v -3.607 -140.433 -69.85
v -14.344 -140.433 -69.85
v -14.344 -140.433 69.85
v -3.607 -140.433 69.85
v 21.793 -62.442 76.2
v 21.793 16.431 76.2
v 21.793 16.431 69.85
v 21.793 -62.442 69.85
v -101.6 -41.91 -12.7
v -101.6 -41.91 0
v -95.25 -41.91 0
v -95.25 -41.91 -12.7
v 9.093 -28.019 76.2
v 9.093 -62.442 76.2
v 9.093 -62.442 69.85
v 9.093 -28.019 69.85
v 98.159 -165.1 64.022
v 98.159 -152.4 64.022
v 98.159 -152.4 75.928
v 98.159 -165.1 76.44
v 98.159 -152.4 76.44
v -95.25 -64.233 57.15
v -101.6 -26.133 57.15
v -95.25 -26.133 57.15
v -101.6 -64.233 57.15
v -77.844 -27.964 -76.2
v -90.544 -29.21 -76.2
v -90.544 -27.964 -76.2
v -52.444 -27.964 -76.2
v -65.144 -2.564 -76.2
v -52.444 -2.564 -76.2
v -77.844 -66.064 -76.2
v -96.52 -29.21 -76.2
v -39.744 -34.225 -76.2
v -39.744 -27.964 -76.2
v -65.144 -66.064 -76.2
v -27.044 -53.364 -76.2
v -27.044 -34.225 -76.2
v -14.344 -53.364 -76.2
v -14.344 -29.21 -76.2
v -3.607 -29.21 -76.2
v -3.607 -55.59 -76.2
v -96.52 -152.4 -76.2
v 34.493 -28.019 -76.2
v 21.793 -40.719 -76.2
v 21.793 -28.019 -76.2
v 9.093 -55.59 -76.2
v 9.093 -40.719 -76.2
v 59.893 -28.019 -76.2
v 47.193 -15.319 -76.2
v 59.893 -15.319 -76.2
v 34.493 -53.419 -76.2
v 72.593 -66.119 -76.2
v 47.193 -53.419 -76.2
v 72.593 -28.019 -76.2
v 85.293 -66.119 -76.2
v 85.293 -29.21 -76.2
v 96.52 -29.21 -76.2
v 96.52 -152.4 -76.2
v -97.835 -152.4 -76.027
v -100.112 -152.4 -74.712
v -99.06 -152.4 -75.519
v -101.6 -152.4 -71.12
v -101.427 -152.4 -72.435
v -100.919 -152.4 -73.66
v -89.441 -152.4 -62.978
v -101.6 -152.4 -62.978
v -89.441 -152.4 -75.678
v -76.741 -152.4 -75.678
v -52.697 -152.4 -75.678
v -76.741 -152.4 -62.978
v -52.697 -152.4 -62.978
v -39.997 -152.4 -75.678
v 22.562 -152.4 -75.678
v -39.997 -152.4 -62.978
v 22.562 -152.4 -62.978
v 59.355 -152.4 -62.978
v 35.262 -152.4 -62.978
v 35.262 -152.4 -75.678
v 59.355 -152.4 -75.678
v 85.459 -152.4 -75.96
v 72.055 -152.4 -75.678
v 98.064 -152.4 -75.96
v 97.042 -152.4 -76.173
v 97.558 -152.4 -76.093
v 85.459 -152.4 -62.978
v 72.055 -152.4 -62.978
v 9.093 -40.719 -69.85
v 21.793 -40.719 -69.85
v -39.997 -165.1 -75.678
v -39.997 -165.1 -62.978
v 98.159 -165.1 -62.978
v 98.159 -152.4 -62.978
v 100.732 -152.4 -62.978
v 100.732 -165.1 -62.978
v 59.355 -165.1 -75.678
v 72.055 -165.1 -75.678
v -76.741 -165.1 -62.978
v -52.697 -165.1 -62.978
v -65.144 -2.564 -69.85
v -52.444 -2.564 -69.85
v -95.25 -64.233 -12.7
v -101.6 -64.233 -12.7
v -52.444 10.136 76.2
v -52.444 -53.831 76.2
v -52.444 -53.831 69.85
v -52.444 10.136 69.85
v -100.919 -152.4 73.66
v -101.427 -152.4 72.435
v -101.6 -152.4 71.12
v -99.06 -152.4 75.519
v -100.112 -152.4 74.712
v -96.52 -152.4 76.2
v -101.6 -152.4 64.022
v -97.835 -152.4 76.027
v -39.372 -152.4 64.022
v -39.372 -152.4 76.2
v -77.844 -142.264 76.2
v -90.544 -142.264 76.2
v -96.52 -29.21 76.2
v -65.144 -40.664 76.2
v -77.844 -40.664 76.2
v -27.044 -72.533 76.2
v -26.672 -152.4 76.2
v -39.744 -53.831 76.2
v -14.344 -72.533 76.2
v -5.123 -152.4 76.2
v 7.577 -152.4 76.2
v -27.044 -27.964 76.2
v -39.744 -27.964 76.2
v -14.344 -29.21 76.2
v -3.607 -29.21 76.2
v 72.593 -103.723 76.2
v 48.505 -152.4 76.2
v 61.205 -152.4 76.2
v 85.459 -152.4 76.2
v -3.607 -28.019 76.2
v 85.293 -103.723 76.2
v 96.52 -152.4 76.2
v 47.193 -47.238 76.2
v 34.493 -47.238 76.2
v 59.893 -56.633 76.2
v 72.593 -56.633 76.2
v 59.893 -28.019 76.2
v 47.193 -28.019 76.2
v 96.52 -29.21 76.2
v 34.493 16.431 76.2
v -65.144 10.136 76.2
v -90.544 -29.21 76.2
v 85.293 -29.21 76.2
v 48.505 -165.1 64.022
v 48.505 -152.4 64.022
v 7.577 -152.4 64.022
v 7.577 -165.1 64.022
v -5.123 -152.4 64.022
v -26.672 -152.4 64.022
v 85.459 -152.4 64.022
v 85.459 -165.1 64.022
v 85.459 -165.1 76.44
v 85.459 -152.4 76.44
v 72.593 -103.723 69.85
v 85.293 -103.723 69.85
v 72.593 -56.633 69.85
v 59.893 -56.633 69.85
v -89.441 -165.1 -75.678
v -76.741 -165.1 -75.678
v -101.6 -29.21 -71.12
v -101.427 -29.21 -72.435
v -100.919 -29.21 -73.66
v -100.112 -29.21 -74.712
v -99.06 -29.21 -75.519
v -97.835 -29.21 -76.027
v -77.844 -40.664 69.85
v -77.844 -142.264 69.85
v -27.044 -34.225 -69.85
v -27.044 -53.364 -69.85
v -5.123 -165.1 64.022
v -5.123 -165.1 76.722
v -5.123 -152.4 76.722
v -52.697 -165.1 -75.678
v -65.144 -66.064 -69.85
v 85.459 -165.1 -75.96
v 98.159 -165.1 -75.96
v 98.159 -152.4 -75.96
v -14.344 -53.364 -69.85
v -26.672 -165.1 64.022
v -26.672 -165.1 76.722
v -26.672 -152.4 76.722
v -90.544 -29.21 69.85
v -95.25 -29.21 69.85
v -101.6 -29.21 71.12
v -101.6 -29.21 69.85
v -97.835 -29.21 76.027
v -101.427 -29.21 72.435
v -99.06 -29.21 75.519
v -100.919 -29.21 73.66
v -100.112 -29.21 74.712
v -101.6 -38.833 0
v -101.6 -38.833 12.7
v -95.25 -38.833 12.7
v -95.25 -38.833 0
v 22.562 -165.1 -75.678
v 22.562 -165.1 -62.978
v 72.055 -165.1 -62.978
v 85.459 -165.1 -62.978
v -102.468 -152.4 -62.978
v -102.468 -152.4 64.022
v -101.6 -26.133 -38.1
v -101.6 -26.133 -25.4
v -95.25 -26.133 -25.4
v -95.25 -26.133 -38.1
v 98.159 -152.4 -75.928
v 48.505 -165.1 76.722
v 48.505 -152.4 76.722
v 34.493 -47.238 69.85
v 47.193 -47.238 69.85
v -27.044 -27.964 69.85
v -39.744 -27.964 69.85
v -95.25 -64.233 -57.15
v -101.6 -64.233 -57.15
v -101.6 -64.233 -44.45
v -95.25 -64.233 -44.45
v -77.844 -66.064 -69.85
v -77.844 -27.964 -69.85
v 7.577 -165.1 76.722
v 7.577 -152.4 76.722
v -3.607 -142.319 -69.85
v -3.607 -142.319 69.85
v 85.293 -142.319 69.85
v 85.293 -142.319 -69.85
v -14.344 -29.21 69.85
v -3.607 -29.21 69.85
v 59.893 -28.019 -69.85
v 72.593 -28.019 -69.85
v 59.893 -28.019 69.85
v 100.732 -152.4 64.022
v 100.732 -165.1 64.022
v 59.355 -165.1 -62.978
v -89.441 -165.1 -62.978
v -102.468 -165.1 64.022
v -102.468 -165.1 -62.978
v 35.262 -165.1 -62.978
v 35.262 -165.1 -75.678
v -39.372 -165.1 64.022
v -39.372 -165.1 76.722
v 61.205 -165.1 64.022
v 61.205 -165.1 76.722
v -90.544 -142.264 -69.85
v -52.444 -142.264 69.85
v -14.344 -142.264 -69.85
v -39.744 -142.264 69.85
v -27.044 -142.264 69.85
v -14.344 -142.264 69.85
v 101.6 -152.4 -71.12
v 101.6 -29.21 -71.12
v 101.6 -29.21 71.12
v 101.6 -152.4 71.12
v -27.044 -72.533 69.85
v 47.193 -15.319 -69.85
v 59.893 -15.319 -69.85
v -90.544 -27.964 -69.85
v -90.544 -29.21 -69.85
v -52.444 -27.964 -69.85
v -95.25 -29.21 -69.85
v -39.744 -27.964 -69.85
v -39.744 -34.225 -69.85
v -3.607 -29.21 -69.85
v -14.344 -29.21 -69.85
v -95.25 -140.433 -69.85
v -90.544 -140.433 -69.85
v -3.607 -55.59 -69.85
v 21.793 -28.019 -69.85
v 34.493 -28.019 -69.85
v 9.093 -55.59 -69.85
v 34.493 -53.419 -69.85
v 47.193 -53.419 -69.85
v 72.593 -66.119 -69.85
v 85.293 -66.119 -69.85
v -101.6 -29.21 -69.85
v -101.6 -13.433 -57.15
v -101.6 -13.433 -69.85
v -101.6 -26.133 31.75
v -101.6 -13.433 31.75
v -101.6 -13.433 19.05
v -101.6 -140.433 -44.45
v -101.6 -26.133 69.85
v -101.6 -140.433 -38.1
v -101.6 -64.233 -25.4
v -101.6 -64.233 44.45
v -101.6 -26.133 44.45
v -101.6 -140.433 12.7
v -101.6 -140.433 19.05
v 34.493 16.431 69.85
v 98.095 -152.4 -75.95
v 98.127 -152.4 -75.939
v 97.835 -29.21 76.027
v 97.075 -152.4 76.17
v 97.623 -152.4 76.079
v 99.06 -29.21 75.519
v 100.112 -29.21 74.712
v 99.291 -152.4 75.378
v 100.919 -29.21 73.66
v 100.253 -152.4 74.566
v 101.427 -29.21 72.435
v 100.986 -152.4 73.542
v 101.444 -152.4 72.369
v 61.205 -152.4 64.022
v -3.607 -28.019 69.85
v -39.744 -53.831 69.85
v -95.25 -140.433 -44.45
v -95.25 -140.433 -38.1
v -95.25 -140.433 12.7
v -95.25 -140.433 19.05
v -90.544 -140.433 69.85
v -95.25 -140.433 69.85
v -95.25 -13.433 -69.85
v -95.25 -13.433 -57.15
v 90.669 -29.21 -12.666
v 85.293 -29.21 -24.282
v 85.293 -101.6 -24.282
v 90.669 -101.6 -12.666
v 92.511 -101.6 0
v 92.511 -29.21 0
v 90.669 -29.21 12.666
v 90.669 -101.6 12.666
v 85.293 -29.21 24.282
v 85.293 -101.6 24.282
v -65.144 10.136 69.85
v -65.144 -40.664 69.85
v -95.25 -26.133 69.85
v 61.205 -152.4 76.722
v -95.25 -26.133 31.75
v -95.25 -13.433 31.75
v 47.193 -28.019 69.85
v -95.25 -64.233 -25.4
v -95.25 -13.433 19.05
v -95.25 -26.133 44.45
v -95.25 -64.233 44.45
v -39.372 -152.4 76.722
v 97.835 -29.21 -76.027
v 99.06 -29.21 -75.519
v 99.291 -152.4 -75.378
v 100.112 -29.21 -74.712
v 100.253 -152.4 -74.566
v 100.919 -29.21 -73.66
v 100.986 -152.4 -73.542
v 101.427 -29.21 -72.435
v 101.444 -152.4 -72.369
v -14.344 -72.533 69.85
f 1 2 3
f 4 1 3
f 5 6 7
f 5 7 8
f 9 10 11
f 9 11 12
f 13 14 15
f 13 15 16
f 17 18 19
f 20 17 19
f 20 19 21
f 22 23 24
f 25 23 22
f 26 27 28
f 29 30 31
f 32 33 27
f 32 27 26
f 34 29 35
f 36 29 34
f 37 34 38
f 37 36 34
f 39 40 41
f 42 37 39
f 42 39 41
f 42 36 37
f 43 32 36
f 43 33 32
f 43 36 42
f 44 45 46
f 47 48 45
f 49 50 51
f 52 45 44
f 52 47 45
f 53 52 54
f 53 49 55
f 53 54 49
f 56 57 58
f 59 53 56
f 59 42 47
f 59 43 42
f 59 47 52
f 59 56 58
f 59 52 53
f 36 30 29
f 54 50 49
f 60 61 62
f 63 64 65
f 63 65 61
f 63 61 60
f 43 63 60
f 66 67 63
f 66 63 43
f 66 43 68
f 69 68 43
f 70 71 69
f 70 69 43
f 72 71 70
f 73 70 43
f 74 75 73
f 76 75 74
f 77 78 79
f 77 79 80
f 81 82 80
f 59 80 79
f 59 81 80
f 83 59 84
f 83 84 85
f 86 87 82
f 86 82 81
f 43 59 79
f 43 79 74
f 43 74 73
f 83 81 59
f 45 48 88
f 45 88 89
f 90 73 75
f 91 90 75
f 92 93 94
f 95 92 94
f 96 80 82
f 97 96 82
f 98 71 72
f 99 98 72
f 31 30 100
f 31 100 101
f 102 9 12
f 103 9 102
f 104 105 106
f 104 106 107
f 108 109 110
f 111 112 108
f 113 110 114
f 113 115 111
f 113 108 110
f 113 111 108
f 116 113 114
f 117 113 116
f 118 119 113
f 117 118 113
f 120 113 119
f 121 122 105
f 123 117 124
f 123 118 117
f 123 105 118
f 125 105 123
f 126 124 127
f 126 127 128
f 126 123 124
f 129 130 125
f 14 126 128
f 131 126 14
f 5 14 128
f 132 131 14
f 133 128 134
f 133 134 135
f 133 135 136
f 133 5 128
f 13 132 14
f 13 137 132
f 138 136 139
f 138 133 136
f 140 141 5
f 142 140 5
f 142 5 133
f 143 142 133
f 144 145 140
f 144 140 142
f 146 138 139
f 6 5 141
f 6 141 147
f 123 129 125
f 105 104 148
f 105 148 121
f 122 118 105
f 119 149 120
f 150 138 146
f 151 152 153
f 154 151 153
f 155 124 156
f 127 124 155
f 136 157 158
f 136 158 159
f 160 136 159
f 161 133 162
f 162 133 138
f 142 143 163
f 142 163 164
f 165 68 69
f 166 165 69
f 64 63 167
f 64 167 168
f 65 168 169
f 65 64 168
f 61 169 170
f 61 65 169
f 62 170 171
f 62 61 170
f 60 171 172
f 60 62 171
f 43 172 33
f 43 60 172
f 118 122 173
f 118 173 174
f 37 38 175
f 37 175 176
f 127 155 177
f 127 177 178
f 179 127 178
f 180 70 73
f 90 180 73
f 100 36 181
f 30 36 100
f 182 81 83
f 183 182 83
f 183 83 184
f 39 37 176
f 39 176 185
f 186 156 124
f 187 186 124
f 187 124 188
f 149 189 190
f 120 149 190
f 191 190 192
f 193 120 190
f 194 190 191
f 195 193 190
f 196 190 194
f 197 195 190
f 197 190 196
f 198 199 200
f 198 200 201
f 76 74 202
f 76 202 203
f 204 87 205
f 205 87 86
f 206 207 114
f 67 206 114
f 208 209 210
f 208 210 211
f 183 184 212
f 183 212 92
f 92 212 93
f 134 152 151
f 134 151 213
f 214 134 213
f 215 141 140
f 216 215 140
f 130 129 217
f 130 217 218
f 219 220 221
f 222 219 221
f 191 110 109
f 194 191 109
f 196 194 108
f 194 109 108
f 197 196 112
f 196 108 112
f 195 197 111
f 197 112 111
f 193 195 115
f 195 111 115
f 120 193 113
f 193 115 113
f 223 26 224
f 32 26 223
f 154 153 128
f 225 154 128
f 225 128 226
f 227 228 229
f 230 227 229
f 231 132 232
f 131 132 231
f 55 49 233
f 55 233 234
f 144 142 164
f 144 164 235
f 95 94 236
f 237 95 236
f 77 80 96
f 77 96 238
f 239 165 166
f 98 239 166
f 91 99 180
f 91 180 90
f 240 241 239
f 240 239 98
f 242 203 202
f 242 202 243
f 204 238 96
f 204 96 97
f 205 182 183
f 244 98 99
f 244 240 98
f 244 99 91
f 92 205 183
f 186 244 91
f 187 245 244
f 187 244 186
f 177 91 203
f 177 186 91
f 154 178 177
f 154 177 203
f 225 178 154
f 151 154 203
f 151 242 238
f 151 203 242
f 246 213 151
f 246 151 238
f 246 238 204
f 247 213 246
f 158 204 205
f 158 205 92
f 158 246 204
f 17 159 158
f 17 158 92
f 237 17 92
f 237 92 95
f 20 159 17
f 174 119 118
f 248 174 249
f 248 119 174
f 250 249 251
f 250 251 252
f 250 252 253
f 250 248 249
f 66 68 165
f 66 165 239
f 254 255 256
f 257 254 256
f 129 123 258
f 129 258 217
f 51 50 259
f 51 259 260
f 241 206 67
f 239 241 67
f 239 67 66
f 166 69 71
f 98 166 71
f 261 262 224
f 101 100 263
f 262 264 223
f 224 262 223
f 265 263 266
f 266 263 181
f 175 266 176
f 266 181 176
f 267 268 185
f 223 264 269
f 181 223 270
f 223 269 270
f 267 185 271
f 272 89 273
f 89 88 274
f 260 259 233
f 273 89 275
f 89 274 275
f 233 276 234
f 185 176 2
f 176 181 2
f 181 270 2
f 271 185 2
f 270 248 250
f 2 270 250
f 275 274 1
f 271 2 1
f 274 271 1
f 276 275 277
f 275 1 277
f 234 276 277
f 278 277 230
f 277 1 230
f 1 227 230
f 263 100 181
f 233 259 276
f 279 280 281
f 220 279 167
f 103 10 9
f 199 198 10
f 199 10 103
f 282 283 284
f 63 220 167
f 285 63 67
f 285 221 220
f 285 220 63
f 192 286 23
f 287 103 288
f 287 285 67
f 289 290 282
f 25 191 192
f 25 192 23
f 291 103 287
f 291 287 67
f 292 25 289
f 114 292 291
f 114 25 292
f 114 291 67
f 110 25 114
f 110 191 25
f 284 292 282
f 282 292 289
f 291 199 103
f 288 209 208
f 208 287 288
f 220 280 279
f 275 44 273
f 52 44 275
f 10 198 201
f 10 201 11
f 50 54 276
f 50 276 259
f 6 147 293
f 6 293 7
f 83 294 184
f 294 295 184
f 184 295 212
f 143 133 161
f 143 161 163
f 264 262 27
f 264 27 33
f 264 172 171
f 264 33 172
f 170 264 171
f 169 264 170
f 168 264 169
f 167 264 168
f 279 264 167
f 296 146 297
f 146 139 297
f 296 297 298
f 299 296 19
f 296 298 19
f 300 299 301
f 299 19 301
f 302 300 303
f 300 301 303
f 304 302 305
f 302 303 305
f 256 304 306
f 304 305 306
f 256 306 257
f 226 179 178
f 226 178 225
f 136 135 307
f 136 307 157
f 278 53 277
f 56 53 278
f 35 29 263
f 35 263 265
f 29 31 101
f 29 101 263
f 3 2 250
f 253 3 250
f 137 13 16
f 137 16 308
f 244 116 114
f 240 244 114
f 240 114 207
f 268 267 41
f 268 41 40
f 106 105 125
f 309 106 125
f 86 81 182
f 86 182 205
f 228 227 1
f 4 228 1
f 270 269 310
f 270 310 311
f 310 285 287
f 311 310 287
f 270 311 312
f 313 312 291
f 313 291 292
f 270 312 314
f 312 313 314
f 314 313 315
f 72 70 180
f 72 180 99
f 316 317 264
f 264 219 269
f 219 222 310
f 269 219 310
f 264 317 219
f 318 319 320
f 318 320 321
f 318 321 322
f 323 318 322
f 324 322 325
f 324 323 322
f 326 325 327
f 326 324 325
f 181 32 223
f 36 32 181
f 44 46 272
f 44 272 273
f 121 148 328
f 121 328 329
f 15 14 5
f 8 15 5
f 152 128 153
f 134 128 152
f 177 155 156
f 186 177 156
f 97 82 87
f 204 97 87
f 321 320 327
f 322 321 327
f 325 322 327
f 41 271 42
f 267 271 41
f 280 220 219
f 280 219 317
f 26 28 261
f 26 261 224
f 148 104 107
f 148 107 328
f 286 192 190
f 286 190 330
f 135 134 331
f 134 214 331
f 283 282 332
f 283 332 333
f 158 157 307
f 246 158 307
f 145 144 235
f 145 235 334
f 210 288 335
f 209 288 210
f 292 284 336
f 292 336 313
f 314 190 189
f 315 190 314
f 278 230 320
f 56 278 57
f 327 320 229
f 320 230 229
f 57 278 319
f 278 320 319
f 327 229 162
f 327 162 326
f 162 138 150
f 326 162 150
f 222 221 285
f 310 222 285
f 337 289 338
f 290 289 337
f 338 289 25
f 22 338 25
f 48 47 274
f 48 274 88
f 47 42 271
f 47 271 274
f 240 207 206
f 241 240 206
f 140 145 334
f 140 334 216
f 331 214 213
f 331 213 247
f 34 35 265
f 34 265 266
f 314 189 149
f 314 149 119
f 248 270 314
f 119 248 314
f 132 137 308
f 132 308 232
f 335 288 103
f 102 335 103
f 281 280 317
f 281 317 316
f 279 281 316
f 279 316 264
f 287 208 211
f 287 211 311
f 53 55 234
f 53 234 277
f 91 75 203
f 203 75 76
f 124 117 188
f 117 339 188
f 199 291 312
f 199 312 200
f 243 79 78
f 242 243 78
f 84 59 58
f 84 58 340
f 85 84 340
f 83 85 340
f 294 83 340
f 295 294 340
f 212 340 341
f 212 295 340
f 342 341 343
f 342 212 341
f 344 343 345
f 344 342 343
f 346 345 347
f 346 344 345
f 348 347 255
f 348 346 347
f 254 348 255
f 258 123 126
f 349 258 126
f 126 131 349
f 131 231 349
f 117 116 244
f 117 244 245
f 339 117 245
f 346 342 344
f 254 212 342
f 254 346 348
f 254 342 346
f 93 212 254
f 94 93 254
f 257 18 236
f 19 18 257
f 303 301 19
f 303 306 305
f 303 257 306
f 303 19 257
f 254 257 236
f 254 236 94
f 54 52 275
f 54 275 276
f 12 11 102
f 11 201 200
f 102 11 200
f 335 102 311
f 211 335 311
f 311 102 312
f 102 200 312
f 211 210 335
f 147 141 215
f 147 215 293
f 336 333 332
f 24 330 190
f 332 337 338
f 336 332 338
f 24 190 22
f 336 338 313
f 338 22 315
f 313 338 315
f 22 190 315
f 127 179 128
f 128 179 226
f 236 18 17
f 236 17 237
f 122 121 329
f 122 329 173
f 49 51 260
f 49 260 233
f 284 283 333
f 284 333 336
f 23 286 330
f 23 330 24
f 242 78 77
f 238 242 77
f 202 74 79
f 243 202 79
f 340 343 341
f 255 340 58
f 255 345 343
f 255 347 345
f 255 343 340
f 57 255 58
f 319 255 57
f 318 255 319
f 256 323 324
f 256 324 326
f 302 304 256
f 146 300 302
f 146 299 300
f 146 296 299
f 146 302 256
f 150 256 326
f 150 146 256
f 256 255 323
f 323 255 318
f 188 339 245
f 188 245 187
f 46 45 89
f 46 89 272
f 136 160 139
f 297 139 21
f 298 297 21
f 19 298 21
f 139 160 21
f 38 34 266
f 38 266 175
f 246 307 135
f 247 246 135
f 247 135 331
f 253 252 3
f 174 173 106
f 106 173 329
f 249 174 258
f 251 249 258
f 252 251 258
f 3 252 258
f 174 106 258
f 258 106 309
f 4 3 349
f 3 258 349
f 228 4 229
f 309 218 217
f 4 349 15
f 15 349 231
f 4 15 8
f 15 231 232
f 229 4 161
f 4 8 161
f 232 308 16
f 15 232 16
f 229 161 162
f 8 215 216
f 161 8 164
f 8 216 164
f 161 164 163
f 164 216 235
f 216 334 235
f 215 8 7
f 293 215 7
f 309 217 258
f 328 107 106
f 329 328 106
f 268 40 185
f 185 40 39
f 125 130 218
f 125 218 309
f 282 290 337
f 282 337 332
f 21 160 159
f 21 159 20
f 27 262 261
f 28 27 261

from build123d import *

# Parameters (mm, degrees)
F0_W      = 203.2
F0_H      = 152.4
F2_DEPTH  = 152.4
F3_W      = 88.9
F3_H      = 139.7
F4_DEPTH  = 12.7
F5_R      = 6.35
F6_DEPTH  = 127
F1_R      = 44.45
F8_DEPTH  = 101.6
F9_R      = 5.08
F10_W     = 127
F10_H     = 139.7
F11_DEPTH = 101.6
F12_W     = 193.04
F12_H     = 142.24
F12_W_2   = 88.9
F12_H_2   = 139.7
F12_R     = 44.45
F12_R_2   = 6.35
F14_W     = 88.9
F14_H     = 139.7
F14_W_2   = 312.5441968441
F14_H_2   = 209.9168300629
F15_DEPTH = 29.21
F13_W     = 76.2
F13_H     = 127
F16_DEPTH = 152.4
F17_W     = 88.9
F17_H     = 127
F18_DEPTH = 253.619
F19_W     = 12.7
F19_H     = 38.596359849
F19_H_2   = 95.0815806389
F19_H_3   = 79.8769908249
F19_H_4   = 69.7309503555
F19_H_5   = 88.4333456159
F20_DEPTH = 6.35
F21_W     = 76.2
F21_H     = 12.7
F22_DEPTH = 6.35
F23_W     = 12.7
F23_H     = 76.2
F23_H_2   = 86.7299305499
F23_H_3   = 88.9
F24_DEPTH = 6.35
F25_W     = 12.7
F25_H     = 12.7
F25_H_2   = 12.4177324921
F25_H_3   = 127
F25_W_2   = 2.5730909735
F25_H_4   = 12.9822675079
F26_DEPTH = 12.7


with BuildPart() as f2:
    # F0 (on Front) → F2 (new body)
    with BuildSketch(Plane.XZ):
        Rectangle(F0_W, F0_H)
    extrude(amount=F2_DEPTH)

    # F3 (on Front) → F4 (cut)
    with BuildSketch(Plane.XZ):
        with Locations((-50.6012091197, -0.215793407)):
            Rectangle(F3_W, F3_H)
    extrude(amount=F4_DEPTH, mode=Mode.SUBTRACT)

    # F5 (on face) → F6 (cut)
    with BuildSketch(Plane(origin=(0, -12.7, 0), x_dir=(-1, 0, 0), z_dir=(0, 1, 0))):
        with Locations((19.2305770945, 52.8817098261)):
            Circle(F5_R)
        with Locations((19.2305770945, 31.2917098261)):
            Circle(F5_R)
        with Locations((19.2305770945, 9.7017098261)):
            Circle(F5_R)
        with Locations((19.2305770945, -11.8882901739)):
            Circle(F5_R)
        with Locations((19.2305770945, -33.4782901739)):
            Circle(F5_R)
        with Locations((19.2305770945, -55.0682901739)):
            Circle(F5_R)
        with Locations((40.8205770945, 52.8817098261)):
            Circle(F5_R)
        with Locations((40.8205770945, 31.2917098261)):
            Circle(F5_R)
        with Locations((40.8205770945, 9.7017098261)):
            Circle(F5_R)
        with Locations((40.8205770945, -11.8882901739)):
            Circle(F5_R)
        with Locations((40.8205770945, -33.4782901739)):
            Circle(F5_R)
        with Locations((40.8205770945, -55.0682901739)):
            Circle(F5_R)
        with Locations((62.4105770945, 52.8817098261)):
            Circle(F5_R)
        with Locations((62.4105770945, 31.2917098261)):
            Circle(F5_R)
        with Locations((62.4105770945, 9.7017098261)):
            Circle(F5_R)
        with Locations((62.4105770945, -11.8882901739)):
            Circle(F5_R)
        with Locations((62.4105770945, -33.4782901739)):
            Circle(F5_R)
        with Locations((62.4105770945, -55.0682901739)):
            Circle(F5_R)
        with Locations((84.0005770945, 52.8817098261)):
            Circle(F5_R)
        with Locations((84.0005770945, 31.2917098261)):
            Circle(F5_R)
        with Locations((84.0005770945, 9.7017098261)):
            Circle(F5_R)
        with Locations((84.0005770945, -11.8882901739)):
            Circle(F5_R)
        with Locations((84.0005770945, -33.4782901739)):
            Circle(F5_R)
        with Locations((84.0005770945, -55.0682901739)):
            Circle(F5_R)
    extrude(amount=-F6_DEPTH, mode=Mode.SUBTRACT)

    # F1 (on face) → F8 (cut)
    with BuildSketch(Plane.XZ):
        with Locations((48.0613298714, 0)):
            Circle(F1_R)
    extrude(amount=F8_DEPTH, mode=Mode.SUBTRACT)

    # F9
    f9_edges = [f2.edges().sort_by_distance(p)[0] for p in [
        (0, 0, 76.2),
        (101.6, 0, 0),
        (0, 0, -76.2),
        (-101.6, 0, 0),
        (-101.6, -76.2, -76.2),
        (101.6, -76.2, -76.2),
        (101.6, -76.2, 76.2),
        (-101.6, -76.2, 76.2),
    ]]
    fillet(f9_edges, radius=F9_R)

    # F10 (on face) → F11 (cut)
    with BuildSketch(Plane(origin=(-101.6, 0, 0), x_dir=(0, -1, 0), z_dir=(-1, 0, 0))):
        with Locations((76.9326984882, 0)):
            Rectangle(F10_W, F10_H)
    extrude(amount=-F11_DEPTH, mode=Mode.SUBTRACT)

    # F12 (on face) + F14 (on face) → F15 (cut)
    with BuildSketch(Plane(origin=(0, 0, 0), x_dir=(-1, 0, 0), z_dir=(0, 1, 0))):
        Rectangle(F12_W, F12_H)
        with Locations((50.6012091197, -0.215793407)):
            Rectangle(F12_W_2, F12_H_2, mode=Mode.SUBTRACT)
        with Locations((-48.0613298714, 0)):
            Circle(F12_R, mode=Mode.SUBTRACT)
        with Locations((-87.3994901776, 62.0860531926)):
            Circle(F12_R_2, mode=Mode.SUBTRACT)
    with BuildSketch(Plane(origin=(0, 0, 0), x_dir=(-1, 0, 0), z_dir=(0, 1, 0))):
        with Locations((50.6012091197, -0.215793407)):
            Rectangle(F14_W, F14_H)
        Rectangle(F14_W_2, F14_H_2)
    extrude(amount=-F15_DEPTH, mode=Mode.SUBTRACT)

    # F13 (on face) → F16 (cut)
    with BuildSketch(Plane(origin=(0, 0, -76.2), x_dir=(1, 0, 0), z_dir=(0, 0, -1))):
        with Locations((-52.4439588189, 78.7642598152)):
            Rectangle(F13_W, F13_H)
    extrude(amount=-F16_DEPTH, mode=Mode.SUBTRACT)

    # F17 (on Top) → F18 (cut, symmetric)
    with BuildSketch(Plane.XY):
        with Locations((40.8431477845, -78.819476068)):
            Rectangle(F17_W, F17_H)
    extrude(amount=F18_DEPTH, both=True, mode=Mode.SUBTRACT)

    # F19 (on face) → F20 (join)
    with BuildSketch(Plane.XY.offset(76.2)):
        with Locations((78.9431477845, -123.0212961435)):
            Rectangle(F19_W, F19_H)
        Polygon((59.8931477845, -142.319476068), (59.8931477845, -56.6326193511), (59.8931477845, -28.019476068), (47.1931477845, -28.019476068), (47.1931477845, -47.2378954291), (47.1931477845, -142.319476068), align=None)
        Polygon((72.5931477845, -142.319476068), (72.5931477845, -103.723116219), (72.5931477845, -56.6326193511), (59.8931477845, -56.6326193511), (59.8931477845, -142.319476068), align=None)
        with Locations((40.8431477845, -94.7786857486)):
            Rectangle(F19_W, F19_H_2)
        Polygon((21.7931477845, -62.4424852431), (21.7931477845, -142.319476068), (34.4931477845, -142.319476068), (34.4931477845, -47.2378954291), (34.4931477845, 16.430523932), (21.7931477845, 16.430523932), align=None)
        with Locations((15.4431477845, -102.3809806556)):
            Rectangle(F19_W, F19_H_3)
        with Locations((-20.6939588189, -107.3987846375)):
            Rectangle(F19_W, F19_H_4)
        Polygon((-39.7439588189, -53.8309141994), (-39.7439588189, -142.2642598152), (-27.0439588189, -142.2642598152), (-27.0439588189, -72.5333094597), (-27.0439588189, -27.9642598152), (-39.7439588189, -27.9642598152), align=None)
        with Locations((-46.0939588189, -98.0475870073)):
            Rectangle(F19_W, F19_H_5)
        Polygon((-65.1439588189, -40.6642598152), (-65.1439588189, -142.2642598152), (-52.4439588189, -142.2642598152), (-52.4439588189, -53.8309141994), (-52.4439588189, 10.1357401848), (-65.1439588189, 10.1357401848), align=None)
        Polygon((-77.8439588189, -91.4642598152), (-77.8439588189, -142.2642598152), (-65.1439588189, -142.2642598152), (-65.1439588189, -40.6642598152), (-77.8439588189, -40.6642598152), align=None)
        Polygon((-3.6068522155, -28.019476068), (-3.6068522155, -29.21), (-3.6068522155, -142.319476068), (9.0931477845, -142.319476068), (9.0931477845, -62.4424852431), (9.0931477845, -28.019476068), align=None)
    extrude(amount=-F20_DEPTH)

    # F21 (on face) → F22 (join)
    with BuildSketch(Plane(origin=(-101.6, 0, 0), x_dir=(0, -1, 0), z_dir=(-1, 0, 0))):
        Polygon((13.4326984882, -57.15), (13.4326984882, -69.85), (140.4326984882, -69.85), (140.4326984882, -57.15), (64.2326984882, -57.15), align=None)
        with Locations((102.3326984882, -50.8)):
            Rectangle(F21_W, F21_H)
        Polygon((26.1326984882, -25.4), (26.1326984882, -38.1), (140.4326984882, -38.1), (140.4326984882, -25.4), (64.2326984882, -25.4), align=None)
        with Locations((102.3326984882, -19.05)):
            Rectangle(F21_W, F21_H)
        Polygon((64.2326984882, -12.7), (140.4326984882, -12.7), (140.4326984882, 0), (41.91, 0), (41.91, -12.7), align=None)
        Polygon((41.91, 0), (140.4326984882, 0), (140.4326984882, 12.7), (38.8326984882, 12.7), (38.8326984882, 0), align=None)
        Polygon((13.4326984882, 31.75), (13.4326984882, 19.05), (140.4326984882, 19.05), (140.4326984882, 31.75), (26.1326984882, 31.75), align=None)
        Polygon((26.1326984882, 31.75), (140.4326984882, 31.75), (140.4326984882, 44.45), (64.2326984882, 44.45), (26.1326984882, 44.45), align=None)
        with Locations((102.3326984882, 50.8)):
            Rectangle(F21_W, F21_H)
        Polygon((64.2326984882, 57.15), (140.4326984882, 57.15), (140.4326984882, 69.85), (26.1326984882, 69.85), (26.1326984882, 57.15), align=None)
    extrude(amount=-F22_DEPTH)

    # F23 (on face) → F24 (join)
    with BuildSketch(Plane(origin=(0, 0, -76.2), x_dir=(1, 0, 0), z_dir=(0, 0, -1))):
        with Locations((78.9431477845, 104.219476068)):
            Rectangle(F23_W, F23_H)
        with Locations((2.7431477845, 98.9545107931)):
            Rectangle(F23_W, F23_H_2)
        with Locations((-20.6939588189, 97.8142598152)):
            Rectangle(F23_W, F23_H_3)
        Polygon((72.5931477845, 28.019476068), (72.5931477845, 66.119476068), (72.5931477845, 142.319476068), (59.8931477845, 142.319476068), (59.8931477845, 28.019476068), align=None)
        Polygon((59.8931477845, 28.019476068), (59.8931477845, 142.319476068), (47.1931477845, 142.319476068), (47.1931477845, 53.419476068), (47.1931477845, 15.319476068), (59.8931477845, 15.319476068), align=None)
        with Locations((40.8431477845, 97.869476068)):
            Rectangle(F23_W, F23_H_3)
        Polygon((34.4931477845, 53.419476068), (34.4931477845, 142.319476068), (21.7931477845, 142.319476068), (21.7931477845, 40.719476068), (21.7931477845, 28.019476068), (34.4931477845, 28.019476068), align=None)
        Polygon((21.7931477845, 40.719476068), (21.7931477845, 142.319476068), (9.0931477845, 142.319476068), (9.0931477845, 55.5895455182), (9.0931477845, 40.719476068), align=None)
        Polygon((-27.0439588189, 142.2642598152), (-39.7439588189, 142.2642598152), (-39.7439588189, 34.2246964574), (-27.0439588189, 34.2246964574), (-27.0439588189, 53.3642598152), align=None)
        Polygon((-39.7439588189, 142.2642598152), (-52.4439588189, 142.2642598152), (-52.4439588189, 27.9642598152), (-39.7439588189, 27.9642598152), (-39.7439588189, 34.2246964574), align=None)
        Polygon((-52.4439588189, 142.2642598152), (-65.1439588189, 142.2642598152), (-65.1439588189, 66.0642598152), (-65.1439588189, 2.5642598152), (-52.4439588189, 2.5642598152), (-52.4439588189, 27.9642598152), align=None)
        with Locations((-71.4939588189, 104.1642598152)):
            Rectangle(F23_W, F23_H)
        Polygon((-90.5439588189, 142.2642598152), (-90.5439588189, 29.21), (-90.5439588189, 27.9642598152), (-77.8439588189, 27.9642598152), (-77.8439588189, 66.0642598152), (-77.8439588189, 142.2642598152), align=None)
    extrude(amount=-F24_DEPTH)

    # F25 (on face) → F26 (join)
    with BuildSketch(Plane.XZ.offset(152.4)):
        Polygon((85.4586139321, 64.0224360317), (61.2050529242, 64.0224360317), (48.5050529242, 64.0224360317), (7.57732118, 64.0224360317), (-5.12267882, 64.0224360317), (-26.6723212183, 64.0224360317), (-39.3723212183, 64.0224360317), (-102.4682950944, 64.0224360317), (-102.4682950944, 44.3732525826), (-89.7682950944, 44.3732525826), (-89.7682950944, 31.6732525826), (-102.4682950944, 31.6732525826), (-102.4682950944, -25.3421988666), (-89.7682950944, -25.3421988666), (-89.7682950944, -38.0421988666), (-102.4682950944, -38.0421988666), (-102.4682950944, -62.9775639683), (-89.4405841827, -62.9775639683), (-76.7405841827, -62.9775639683), (-52.6970252395, -62.9775639683), (-39.9970252395, -62.9775639683), (22.5620511919, -62.9775639683), (35.2620511919, -62.9775639683), (59.3553744256, -62.9775639683), (72.0553744256, -62.9775639683), (85.4586139321, -62.9775639683), align=None)
        with Locations((54.8550529242, 70.3724360317)):
            Rectangle(F25_W, F25_H)
        with Locations((91.8086139321, 70.2313022777)):
            Rectangle(F25_W, F25_H_2)
        with Locations((91.8086139321, 0.5224360317)):
            Rectangle(F25_W, F25_H_3)
        with Locations((1.22732118, 70.3724360317)):
            Rectangle(F25_W, F25_H)
        with Locations((99.4451594189, 0.5224360317)):
            Rectangle(F25_W_2, F25_H_3)
        with Locations((91.8086139321, -69.4686977223)):
            Rectangle(F25_W, F25_H_4)
        with Locations((65.7053744256, -69.3275639683)):
            Rectangle(F25_W, F25_H)
        with Locations((-33.0223212183, 70.3724360317)):
            Rectangle(F25_W, F25_H)
        with Locations((28.9120511919, -69.3275639683)):
            Rectangle(F25_W, F25_H)
        with Locations((-96.1182950944, 38.0232525826)):
            Rectangle(F25_W, F25_H)
        with Locations((-46.3470252395, -69.3275639683)):
            Rectangle(F25_W, F25_H)
        with Locations((-96.1182950944, -31.6921988666)):
            Rectangle(F25_W, F25_H)
        with Locations((-83.0905841827, -69.3275639683)):
            Rectangle(F25_W, F25_H)
    extrude(amount=F26_DEPTH)


solid = f2.part
